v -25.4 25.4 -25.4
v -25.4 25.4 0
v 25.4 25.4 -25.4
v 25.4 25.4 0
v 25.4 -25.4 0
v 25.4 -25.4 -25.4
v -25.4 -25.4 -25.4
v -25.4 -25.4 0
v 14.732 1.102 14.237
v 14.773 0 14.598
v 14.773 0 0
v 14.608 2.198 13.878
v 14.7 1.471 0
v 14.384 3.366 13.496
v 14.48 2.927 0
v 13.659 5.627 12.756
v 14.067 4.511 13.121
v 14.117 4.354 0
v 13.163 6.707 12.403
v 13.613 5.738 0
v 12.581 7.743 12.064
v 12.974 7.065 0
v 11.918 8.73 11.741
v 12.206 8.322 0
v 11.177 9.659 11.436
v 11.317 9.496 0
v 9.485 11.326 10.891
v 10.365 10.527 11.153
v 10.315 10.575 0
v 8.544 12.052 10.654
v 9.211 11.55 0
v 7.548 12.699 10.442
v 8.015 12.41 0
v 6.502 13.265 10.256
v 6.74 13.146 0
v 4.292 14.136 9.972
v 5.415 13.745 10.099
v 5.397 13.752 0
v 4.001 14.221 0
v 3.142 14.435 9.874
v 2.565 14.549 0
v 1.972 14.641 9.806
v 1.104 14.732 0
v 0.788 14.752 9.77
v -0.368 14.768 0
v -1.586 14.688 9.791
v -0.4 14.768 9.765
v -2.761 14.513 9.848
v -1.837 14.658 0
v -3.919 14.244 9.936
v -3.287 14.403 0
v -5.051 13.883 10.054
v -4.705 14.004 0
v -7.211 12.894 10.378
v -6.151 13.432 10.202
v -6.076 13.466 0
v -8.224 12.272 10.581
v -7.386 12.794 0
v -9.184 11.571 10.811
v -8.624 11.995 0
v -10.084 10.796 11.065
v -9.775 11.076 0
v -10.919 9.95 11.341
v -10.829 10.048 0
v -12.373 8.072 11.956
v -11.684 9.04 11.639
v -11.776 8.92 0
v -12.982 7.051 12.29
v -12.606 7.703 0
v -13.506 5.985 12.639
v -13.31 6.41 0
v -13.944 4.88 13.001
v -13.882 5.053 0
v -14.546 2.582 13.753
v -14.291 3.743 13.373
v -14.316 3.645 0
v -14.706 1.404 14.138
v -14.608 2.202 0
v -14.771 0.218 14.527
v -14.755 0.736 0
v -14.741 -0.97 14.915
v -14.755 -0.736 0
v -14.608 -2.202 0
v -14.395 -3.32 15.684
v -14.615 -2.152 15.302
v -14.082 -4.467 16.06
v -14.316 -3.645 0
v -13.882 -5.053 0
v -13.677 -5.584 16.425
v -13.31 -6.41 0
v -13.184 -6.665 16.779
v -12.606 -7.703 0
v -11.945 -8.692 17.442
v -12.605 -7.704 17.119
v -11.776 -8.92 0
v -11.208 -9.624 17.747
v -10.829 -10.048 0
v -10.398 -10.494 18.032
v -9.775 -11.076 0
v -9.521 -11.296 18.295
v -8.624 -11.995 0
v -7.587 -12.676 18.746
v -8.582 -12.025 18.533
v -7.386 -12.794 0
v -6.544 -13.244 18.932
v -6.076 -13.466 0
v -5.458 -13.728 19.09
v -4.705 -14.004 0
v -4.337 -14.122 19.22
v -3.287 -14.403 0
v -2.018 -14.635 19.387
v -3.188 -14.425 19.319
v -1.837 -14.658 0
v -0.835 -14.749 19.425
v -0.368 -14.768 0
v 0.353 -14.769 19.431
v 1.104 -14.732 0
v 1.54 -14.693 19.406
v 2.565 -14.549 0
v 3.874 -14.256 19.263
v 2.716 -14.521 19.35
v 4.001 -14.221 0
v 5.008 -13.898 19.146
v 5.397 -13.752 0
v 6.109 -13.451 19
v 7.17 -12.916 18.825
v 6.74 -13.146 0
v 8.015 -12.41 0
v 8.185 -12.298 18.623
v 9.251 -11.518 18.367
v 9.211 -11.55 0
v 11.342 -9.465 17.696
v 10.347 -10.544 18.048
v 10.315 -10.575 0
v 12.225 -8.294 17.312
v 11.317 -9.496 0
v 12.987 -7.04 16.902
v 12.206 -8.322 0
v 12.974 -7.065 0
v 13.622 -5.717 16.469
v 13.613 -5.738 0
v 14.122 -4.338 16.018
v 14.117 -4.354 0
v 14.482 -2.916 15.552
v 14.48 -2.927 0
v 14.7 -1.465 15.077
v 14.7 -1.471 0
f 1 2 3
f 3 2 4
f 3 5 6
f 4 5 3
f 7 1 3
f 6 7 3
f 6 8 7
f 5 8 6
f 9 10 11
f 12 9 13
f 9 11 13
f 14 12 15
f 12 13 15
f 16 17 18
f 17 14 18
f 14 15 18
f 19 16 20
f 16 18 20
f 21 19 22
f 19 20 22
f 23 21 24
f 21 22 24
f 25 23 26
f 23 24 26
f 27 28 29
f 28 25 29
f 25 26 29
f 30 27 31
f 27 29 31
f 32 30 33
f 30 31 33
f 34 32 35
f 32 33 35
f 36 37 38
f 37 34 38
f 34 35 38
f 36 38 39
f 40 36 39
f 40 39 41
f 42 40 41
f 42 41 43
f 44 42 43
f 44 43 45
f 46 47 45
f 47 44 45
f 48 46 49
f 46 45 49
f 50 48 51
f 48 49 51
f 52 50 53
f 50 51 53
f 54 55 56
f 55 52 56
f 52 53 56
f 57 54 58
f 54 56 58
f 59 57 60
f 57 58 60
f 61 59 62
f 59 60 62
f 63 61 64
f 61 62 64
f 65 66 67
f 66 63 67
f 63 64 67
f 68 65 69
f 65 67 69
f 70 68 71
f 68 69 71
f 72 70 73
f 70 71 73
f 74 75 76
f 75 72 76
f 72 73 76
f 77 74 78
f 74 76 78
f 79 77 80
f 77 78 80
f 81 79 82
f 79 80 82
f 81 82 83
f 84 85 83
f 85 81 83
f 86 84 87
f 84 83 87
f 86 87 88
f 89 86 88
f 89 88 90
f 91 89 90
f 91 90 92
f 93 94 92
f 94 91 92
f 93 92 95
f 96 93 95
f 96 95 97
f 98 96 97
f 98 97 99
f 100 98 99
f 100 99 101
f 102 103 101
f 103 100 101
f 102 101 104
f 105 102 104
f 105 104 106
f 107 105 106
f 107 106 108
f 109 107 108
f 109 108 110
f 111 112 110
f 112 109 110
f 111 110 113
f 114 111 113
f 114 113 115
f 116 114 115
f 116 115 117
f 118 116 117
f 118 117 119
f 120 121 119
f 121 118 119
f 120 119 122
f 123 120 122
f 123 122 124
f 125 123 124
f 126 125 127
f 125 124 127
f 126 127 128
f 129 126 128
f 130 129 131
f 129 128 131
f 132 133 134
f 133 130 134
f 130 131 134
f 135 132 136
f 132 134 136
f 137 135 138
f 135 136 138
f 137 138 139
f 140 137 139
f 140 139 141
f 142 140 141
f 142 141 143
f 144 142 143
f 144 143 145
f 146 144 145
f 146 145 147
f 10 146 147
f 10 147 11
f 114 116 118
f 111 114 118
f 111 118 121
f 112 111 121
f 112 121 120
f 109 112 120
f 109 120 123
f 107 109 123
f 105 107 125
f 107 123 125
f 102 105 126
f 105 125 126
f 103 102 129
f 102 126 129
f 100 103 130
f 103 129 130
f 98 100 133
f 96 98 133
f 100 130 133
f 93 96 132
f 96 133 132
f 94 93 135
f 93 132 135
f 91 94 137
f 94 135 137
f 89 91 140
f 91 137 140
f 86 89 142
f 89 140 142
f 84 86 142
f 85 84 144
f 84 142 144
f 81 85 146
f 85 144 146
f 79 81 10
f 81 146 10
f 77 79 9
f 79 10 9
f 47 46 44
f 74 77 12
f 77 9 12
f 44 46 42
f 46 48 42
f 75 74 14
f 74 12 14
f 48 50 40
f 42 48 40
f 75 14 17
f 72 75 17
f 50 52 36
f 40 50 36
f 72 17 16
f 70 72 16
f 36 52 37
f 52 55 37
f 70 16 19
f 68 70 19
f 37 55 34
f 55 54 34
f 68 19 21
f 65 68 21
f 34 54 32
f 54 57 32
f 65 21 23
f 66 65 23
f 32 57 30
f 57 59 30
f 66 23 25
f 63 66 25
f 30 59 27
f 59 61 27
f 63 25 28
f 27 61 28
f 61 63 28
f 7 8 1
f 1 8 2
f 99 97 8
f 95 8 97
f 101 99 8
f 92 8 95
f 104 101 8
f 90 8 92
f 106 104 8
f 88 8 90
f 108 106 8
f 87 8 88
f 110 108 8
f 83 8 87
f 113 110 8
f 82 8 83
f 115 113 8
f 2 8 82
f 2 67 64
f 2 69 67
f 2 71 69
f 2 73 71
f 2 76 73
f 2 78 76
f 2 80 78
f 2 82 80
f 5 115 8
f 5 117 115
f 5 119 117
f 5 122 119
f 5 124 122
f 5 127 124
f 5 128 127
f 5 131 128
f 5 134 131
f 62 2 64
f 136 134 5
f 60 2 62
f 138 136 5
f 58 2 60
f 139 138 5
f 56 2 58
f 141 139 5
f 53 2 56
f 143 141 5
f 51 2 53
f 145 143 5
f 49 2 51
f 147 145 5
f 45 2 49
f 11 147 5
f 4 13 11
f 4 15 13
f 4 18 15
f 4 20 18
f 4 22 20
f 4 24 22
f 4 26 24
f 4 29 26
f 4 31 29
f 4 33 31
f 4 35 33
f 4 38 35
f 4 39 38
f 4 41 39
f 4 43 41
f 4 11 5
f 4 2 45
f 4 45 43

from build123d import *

# Parameters (mm, degrees)
F0_W     = 50.8
F0_H     = 50.8
F1_DEPTH = 25.4
F2_R     = 14.772964705
F3_DEPTH = 25.4
F5_DEPTH = 25.4


with BuildPart() as f1:
    # F0 (on Top) → F1 (new body)
    with BuildSketch(Plane.XY):
        Rectangle(F0_W, F0_H)
    extrude(amount=-F1_DEPTH)

    # F2 (on face) → F3 (join)
    with BuildSketch(Plane.XY):
        Circle(F2_R)
    extrude(amount=F3_DEPTH)

    # F4 (on Right) → F5 (cut, symmetric)
    with BuildSketch(Plane.YZ):
        Polygon((-22.9588039219, 40.4620580375), (-20.6856597215, 21.3676057756), (29.3236263096, 5.0009298138), (29.3236263096, 40.4620580375), align=None)
    extrude(amount=F5_DEPTH, both=True, mode=Mode.SUBTRACT)


solid = f1.part
